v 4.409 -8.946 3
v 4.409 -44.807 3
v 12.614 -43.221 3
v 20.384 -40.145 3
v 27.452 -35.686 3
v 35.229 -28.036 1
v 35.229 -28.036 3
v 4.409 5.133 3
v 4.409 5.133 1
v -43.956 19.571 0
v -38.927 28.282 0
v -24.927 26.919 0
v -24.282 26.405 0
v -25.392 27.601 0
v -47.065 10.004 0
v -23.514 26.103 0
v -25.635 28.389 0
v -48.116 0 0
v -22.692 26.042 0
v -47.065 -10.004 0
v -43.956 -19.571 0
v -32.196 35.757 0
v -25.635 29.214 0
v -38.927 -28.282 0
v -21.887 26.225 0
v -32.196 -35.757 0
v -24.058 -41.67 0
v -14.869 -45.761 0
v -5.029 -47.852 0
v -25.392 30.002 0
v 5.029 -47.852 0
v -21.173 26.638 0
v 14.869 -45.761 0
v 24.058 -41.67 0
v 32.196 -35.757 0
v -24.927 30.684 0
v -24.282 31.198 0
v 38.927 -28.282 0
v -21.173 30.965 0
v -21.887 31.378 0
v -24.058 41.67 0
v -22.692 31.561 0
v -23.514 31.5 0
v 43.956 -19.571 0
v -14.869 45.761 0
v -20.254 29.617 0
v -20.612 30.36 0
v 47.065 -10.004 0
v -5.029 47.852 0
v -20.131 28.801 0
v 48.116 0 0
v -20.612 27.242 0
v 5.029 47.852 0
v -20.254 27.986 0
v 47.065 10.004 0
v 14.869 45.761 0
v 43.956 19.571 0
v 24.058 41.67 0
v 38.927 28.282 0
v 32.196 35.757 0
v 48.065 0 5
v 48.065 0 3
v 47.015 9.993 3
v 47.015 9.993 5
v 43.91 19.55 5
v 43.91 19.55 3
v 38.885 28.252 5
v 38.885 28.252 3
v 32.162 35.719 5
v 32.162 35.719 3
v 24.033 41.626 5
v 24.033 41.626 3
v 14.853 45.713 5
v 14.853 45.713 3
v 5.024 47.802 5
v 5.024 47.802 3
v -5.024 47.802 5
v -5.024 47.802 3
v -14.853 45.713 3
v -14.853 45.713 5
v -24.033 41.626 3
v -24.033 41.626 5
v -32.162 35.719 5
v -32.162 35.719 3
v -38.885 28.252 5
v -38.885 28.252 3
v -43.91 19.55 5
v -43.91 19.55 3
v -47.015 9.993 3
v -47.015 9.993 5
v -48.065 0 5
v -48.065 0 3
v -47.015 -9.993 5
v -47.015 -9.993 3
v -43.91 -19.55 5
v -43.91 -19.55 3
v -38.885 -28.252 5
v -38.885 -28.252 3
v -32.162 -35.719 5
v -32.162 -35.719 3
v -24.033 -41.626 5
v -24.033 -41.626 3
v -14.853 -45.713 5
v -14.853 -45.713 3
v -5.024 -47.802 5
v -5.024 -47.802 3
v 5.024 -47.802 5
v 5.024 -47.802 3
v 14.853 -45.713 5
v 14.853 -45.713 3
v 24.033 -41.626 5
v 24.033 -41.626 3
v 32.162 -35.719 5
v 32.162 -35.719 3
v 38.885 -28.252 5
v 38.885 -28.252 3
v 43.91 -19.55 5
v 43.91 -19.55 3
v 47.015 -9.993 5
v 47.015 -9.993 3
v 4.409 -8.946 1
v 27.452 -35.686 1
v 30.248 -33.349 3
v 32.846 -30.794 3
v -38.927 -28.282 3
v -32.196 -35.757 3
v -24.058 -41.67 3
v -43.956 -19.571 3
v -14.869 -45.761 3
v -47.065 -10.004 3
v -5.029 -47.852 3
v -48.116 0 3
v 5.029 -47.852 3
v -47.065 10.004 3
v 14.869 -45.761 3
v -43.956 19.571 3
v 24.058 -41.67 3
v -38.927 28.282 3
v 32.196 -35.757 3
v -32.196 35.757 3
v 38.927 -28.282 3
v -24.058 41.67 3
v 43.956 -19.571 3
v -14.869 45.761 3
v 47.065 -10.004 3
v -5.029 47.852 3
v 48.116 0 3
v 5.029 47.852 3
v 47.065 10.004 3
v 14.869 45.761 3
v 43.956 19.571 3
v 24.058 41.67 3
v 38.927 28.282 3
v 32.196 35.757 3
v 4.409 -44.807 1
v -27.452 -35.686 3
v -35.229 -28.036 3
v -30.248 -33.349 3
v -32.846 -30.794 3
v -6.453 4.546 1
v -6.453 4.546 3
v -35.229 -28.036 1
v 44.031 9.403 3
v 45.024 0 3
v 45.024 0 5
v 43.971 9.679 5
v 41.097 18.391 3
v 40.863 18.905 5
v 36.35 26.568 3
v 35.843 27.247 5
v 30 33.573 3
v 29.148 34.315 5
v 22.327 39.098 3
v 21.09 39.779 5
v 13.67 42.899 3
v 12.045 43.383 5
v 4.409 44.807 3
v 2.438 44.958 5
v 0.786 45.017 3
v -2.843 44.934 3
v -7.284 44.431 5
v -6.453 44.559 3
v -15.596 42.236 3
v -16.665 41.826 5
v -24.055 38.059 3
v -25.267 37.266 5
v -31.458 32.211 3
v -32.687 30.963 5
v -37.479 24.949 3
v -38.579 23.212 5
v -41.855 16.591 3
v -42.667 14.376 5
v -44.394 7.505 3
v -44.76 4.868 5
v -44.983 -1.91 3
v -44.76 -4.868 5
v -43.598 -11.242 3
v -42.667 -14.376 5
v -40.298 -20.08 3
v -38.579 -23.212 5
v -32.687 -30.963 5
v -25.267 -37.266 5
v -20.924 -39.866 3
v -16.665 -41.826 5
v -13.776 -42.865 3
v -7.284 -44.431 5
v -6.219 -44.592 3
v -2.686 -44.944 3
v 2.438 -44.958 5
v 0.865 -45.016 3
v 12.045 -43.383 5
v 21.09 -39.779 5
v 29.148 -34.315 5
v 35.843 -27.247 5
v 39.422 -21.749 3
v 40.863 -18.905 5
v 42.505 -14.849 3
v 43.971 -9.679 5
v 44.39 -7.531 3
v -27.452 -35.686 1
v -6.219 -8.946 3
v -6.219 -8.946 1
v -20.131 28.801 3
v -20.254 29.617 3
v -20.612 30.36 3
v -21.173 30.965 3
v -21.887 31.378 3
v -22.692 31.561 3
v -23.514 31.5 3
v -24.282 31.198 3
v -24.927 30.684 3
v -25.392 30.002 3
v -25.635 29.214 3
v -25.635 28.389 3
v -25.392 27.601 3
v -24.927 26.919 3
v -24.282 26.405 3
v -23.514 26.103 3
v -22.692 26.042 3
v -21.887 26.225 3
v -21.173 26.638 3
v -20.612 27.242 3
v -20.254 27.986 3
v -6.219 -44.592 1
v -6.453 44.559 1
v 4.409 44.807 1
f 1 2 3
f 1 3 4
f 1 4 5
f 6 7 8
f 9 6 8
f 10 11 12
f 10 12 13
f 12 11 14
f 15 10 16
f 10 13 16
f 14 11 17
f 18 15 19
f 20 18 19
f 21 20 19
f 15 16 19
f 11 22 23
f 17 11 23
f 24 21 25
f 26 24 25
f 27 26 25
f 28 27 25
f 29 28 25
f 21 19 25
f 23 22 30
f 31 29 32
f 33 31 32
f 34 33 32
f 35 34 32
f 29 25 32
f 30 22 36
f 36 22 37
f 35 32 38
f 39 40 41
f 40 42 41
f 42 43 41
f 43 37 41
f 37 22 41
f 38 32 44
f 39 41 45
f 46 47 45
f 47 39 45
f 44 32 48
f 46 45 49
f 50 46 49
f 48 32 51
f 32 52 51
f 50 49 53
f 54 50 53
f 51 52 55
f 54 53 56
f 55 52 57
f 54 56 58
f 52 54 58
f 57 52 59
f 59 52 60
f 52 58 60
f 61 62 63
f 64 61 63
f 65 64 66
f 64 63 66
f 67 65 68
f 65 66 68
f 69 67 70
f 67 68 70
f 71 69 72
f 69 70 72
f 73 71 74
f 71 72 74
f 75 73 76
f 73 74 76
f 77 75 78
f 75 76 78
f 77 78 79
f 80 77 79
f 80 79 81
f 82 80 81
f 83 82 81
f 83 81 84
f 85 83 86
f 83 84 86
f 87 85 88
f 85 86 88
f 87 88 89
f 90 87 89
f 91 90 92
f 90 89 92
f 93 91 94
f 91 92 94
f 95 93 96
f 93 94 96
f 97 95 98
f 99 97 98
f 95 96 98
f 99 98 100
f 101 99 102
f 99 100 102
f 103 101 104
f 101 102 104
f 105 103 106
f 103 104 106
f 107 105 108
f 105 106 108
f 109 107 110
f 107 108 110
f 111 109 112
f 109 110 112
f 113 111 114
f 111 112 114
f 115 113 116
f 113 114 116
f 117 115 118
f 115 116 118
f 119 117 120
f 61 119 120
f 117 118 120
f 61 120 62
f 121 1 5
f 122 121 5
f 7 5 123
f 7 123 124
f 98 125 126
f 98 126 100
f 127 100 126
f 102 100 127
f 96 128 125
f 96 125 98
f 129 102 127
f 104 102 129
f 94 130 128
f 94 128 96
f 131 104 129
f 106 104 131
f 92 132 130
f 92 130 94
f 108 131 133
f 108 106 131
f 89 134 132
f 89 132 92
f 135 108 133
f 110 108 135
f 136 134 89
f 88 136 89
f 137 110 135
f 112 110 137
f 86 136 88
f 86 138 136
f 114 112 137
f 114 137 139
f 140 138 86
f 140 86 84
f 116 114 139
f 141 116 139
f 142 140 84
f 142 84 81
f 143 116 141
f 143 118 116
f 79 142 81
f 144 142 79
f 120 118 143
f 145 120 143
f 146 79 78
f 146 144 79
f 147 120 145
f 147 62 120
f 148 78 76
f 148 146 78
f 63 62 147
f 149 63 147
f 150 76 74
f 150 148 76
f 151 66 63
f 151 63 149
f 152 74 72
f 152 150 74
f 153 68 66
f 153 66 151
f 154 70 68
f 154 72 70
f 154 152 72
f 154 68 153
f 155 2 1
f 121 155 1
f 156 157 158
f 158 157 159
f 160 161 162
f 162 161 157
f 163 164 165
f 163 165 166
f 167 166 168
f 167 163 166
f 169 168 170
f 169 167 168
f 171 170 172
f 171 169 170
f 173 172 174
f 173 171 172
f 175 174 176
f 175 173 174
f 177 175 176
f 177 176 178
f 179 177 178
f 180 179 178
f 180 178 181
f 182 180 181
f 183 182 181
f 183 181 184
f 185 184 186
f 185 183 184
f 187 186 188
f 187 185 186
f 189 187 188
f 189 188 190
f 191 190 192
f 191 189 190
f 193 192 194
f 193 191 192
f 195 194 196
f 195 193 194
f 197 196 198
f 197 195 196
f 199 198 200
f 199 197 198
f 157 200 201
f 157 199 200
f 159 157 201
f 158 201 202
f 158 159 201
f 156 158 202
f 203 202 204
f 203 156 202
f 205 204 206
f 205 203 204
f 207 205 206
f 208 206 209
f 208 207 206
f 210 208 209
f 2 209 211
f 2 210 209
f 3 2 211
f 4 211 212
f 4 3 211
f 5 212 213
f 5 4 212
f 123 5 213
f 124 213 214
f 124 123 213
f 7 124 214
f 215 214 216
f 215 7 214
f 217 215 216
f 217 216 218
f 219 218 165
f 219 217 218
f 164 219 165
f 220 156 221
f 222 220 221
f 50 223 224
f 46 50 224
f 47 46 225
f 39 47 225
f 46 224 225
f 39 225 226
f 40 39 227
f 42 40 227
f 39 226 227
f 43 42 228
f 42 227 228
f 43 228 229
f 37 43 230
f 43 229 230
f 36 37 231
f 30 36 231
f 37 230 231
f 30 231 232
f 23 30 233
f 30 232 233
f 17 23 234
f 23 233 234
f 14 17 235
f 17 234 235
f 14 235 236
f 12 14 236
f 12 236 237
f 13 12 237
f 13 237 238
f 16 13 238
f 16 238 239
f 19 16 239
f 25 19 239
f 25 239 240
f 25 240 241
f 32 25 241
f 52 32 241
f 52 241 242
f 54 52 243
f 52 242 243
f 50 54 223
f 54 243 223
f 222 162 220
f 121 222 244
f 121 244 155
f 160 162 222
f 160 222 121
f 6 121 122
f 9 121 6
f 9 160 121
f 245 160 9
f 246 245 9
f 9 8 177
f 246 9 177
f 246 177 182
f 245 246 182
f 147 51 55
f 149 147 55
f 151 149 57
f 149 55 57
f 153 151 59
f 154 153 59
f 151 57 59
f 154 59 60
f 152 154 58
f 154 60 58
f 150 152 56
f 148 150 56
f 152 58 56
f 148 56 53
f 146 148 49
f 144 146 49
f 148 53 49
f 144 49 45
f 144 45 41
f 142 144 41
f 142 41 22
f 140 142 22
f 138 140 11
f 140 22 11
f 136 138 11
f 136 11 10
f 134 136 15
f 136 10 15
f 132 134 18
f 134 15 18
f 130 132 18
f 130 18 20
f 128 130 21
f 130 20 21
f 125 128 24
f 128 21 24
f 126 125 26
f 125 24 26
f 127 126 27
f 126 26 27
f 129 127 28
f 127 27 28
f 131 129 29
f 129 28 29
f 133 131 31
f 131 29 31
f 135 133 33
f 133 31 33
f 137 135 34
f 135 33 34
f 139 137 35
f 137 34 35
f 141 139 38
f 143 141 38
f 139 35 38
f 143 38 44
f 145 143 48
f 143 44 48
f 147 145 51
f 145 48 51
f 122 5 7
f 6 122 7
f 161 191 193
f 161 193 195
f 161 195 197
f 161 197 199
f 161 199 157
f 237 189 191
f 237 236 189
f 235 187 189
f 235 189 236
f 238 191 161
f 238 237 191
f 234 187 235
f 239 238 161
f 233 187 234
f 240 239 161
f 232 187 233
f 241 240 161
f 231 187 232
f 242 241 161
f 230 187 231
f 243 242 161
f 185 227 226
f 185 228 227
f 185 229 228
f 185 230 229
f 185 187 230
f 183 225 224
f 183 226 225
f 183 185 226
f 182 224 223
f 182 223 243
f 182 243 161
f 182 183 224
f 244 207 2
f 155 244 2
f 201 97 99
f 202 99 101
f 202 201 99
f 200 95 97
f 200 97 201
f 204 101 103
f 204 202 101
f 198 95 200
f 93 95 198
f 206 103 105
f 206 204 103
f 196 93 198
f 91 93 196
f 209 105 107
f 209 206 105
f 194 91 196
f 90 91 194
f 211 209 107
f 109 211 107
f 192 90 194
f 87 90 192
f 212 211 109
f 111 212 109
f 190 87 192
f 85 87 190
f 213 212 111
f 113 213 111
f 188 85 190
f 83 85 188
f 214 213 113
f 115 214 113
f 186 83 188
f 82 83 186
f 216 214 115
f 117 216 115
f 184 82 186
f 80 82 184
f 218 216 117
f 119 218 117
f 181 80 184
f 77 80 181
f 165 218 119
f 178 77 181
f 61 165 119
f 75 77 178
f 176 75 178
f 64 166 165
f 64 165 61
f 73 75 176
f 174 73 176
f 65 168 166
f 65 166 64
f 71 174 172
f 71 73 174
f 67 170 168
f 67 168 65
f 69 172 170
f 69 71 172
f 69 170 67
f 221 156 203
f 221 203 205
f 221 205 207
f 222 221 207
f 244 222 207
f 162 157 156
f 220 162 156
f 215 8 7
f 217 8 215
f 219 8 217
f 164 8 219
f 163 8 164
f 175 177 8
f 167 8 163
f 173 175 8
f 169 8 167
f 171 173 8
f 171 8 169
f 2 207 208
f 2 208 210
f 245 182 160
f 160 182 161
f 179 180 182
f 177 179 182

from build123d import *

# Parameters (mm, degrees)
F0_R     = 48.11598
F1_DEPTH = 3
F2_R     = 48.065002
F2_R_2   = 45.023817
F3_DEPTH = 2
F5_DEPTH = 2
F6_R     = 2.767495
F7_DEPTH = 3


with BuildPart() as f1:
    # F0 (on Top) → F1 (new body)
    with BuildSketch(Plane.XY):
        Circle(F0_R)
    extrude(amount=F1_DEPTH)

    # F2 (on face) → F3 (join)
    with BuildSketch(Plane.XY.offset(3)):
        Circle(F2_R)
        Circle(F2_R_2, mode=Mode.SUBTRACT)
    extrude(amount=F3_DEPTH)

    # F4 (on face) → F5 (cut)
    with BuildSketch(Plane.XY.offset(3)):
        Polygon((-6.218928, -8.945531), (-6.218928, -44.592253), (4.409318, -44.807388), (4.409318, -8.945531), (27.452203, -35.686421), (35.229265, -28.036458), (4.409318, 5.132682), (4.409318, 44.807388), (-6.452514, 44.559053), (-6.452514, 4.54609), (-35.229265, -28.036458), (-27.452203, -35.686421), align=None)
    extrude(amount=-F5_DEPTH, mode=Mode.SUBTRACT)

    # F6 (on face) → F7 (cut)
    with BuildSketch(Plane.XY.offset(3)):
        with Locations((-22.898344, 28.801464)):
            Circle(F6_R)
    extrude(amount=-F7_DEPTH, mode=Mode.SUBTRACT)


solid = f1.part
